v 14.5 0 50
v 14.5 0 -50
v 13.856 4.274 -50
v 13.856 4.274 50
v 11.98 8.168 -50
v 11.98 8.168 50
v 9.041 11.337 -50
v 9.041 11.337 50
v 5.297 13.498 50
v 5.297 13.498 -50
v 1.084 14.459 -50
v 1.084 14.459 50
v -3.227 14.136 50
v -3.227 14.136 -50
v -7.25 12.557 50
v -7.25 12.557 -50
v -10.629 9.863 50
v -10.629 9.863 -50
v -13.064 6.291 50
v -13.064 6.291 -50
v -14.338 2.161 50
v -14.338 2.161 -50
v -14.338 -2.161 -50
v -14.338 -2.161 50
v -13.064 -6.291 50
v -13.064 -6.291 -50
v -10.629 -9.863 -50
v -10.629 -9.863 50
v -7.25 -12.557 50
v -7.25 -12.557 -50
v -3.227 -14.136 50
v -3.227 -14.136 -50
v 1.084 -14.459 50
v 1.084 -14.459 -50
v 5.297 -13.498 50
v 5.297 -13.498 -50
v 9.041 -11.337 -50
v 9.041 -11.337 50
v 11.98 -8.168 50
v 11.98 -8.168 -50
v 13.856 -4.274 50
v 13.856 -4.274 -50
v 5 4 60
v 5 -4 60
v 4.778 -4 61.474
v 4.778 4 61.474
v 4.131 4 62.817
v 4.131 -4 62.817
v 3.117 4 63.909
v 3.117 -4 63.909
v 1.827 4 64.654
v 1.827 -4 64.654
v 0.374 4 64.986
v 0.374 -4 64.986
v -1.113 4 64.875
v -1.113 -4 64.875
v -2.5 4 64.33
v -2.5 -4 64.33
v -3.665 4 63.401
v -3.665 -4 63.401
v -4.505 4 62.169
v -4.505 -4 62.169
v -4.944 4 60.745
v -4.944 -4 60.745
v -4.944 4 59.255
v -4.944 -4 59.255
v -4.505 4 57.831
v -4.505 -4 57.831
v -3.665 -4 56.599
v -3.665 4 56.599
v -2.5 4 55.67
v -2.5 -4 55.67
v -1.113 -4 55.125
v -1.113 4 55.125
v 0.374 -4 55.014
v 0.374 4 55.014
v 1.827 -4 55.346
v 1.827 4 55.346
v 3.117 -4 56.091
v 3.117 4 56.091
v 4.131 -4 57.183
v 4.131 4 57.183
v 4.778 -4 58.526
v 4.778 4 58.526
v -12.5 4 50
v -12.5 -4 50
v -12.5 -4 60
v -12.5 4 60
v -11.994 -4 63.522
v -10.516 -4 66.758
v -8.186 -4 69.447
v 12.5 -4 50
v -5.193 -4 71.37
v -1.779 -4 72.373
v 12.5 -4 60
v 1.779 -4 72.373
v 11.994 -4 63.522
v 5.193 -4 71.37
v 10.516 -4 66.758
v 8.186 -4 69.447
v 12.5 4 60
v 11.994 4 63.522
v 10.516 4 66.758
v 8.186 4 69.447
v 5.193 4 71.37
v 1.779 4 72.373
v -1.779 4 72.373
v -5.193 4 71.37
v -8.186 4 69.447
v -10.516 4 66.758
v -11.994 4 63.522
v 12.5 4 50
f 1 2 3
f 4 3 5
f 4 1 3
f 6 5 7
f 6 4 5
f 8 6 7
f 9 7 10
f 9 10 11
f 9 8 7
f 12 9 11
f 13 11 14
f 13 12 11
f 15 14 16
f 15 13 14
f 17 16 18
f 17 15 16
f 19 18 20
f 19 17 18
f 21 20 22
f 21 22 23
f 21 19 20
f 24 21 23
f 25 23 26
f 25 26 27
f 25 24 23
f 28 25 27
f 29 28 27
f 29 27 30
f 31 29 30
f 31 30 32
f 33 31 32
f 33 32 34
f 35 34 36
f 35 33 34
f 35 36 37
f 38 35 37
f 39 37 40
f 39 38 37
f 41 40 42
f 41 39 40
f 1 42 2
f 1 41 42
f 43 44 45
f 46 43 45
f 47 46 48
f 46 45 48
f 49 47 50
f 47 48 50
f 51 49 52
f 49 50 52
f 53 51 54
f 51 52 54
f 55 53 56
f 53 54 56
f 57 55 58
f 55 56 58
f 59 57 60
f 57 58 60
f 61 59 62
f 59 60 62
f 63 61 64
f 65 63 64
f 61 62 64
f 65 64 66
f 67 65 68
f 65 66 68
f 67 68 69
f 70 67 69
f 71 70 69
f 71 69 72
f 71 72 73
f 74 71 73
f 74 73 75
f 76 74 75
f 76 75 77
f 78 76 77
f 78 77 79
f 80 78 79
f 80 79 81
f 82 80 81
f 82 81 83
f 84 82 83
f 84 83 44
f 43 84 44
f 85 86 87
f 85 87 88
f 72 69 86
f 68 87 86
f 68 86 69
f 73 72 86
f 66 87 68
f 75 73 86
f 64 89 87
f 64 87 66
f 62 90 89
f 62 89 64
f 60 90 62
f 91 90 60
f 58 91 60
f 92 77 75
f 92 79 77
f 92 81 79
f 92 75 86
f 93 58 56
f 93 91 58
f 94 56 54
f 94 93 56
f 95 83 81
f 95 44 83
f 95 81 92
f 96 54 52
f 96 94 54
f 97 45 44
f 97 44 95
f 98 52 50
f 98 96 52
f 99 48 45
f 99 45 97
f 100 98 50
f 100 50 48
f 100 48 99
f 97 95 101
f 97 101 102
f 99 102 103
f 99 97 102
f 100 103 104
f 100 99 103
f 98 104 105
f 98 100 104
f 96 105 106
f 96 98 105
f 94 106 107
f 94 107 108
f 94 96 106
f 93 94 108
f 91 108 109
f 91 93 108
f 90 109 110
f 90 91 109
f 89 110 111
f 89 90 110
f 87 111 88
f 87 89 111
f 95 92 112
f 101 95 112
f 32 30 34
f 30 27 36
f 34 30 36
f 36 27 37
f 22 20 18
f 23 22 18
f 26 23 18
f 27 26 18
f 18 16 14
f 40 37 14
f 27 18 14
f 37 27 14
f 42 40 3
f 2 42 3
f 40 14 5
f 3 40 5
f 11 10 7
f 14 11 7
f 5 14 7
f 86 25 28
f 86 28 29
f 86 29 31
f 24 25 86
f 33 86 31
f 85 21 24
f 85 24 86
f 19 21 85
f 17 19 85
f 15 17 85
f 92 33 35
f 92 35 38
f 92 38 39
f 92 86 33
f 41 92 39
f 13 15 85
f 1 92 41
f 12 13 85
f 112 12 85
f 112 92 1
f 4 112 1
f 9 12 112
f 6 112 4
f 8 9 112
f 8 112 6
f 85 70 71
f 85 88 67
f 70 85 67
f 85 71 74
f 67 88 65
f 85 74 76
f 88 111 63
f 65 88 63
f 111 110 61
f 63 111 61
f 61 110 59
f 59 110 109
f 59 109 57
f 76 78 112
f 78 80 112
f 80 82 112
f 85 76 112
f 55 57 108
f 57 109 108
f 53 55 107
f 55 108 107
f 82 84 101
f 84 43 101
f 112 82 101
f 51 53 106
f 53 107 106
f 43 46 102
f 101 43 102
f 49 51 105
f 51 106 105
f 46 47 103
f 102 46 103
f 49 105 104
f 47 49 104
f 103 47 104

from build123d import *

# Parameters (mm, degrees)
F0_R     = 14.5
F1_DEPTH = 50
F2_W     = 25
F2_H     = 8
F3_DEPTH = 10
F5_DEPTH = 8
F6_R     = 5
F7_DEPTH = 25


with BuildPart() as f1:
    # F0 (on Top) → F1 (new body, symmetric)
    with BuildSketch(Plane.XY):
        Circle(F0_R)
    extrude(amount=F1_DEPTH, both=True)

    # F2 (on face) → F3 (join)
    with BuildSketch(Plane.XY.offset(50)):
        Rectangle(F2_W, F2_H)
    extrude(amount=F3_DEPTH)

    # F4 (on face) → F5 (join)
    with BuildSketch(Plane.XZ.offset(4)):
        with BuildLine():
            Line((-12.5, 60), (12.5, 60))
            ThreePointArc((12.5, 60), (0, 72.5), (-12.5, 60))
        make_face()
    extrude(amount=-F5_DEPTH)

    # F6 (on face) → F7 (cut)
    with BuildSketch(Plane.XZ.offset(4)):
        with Locations((0, 60)):
            Circle(F6_R)
    extrude(amount=-F7_DEPTH, mode=Mode.SUBTRACT)


solid = f1.part
